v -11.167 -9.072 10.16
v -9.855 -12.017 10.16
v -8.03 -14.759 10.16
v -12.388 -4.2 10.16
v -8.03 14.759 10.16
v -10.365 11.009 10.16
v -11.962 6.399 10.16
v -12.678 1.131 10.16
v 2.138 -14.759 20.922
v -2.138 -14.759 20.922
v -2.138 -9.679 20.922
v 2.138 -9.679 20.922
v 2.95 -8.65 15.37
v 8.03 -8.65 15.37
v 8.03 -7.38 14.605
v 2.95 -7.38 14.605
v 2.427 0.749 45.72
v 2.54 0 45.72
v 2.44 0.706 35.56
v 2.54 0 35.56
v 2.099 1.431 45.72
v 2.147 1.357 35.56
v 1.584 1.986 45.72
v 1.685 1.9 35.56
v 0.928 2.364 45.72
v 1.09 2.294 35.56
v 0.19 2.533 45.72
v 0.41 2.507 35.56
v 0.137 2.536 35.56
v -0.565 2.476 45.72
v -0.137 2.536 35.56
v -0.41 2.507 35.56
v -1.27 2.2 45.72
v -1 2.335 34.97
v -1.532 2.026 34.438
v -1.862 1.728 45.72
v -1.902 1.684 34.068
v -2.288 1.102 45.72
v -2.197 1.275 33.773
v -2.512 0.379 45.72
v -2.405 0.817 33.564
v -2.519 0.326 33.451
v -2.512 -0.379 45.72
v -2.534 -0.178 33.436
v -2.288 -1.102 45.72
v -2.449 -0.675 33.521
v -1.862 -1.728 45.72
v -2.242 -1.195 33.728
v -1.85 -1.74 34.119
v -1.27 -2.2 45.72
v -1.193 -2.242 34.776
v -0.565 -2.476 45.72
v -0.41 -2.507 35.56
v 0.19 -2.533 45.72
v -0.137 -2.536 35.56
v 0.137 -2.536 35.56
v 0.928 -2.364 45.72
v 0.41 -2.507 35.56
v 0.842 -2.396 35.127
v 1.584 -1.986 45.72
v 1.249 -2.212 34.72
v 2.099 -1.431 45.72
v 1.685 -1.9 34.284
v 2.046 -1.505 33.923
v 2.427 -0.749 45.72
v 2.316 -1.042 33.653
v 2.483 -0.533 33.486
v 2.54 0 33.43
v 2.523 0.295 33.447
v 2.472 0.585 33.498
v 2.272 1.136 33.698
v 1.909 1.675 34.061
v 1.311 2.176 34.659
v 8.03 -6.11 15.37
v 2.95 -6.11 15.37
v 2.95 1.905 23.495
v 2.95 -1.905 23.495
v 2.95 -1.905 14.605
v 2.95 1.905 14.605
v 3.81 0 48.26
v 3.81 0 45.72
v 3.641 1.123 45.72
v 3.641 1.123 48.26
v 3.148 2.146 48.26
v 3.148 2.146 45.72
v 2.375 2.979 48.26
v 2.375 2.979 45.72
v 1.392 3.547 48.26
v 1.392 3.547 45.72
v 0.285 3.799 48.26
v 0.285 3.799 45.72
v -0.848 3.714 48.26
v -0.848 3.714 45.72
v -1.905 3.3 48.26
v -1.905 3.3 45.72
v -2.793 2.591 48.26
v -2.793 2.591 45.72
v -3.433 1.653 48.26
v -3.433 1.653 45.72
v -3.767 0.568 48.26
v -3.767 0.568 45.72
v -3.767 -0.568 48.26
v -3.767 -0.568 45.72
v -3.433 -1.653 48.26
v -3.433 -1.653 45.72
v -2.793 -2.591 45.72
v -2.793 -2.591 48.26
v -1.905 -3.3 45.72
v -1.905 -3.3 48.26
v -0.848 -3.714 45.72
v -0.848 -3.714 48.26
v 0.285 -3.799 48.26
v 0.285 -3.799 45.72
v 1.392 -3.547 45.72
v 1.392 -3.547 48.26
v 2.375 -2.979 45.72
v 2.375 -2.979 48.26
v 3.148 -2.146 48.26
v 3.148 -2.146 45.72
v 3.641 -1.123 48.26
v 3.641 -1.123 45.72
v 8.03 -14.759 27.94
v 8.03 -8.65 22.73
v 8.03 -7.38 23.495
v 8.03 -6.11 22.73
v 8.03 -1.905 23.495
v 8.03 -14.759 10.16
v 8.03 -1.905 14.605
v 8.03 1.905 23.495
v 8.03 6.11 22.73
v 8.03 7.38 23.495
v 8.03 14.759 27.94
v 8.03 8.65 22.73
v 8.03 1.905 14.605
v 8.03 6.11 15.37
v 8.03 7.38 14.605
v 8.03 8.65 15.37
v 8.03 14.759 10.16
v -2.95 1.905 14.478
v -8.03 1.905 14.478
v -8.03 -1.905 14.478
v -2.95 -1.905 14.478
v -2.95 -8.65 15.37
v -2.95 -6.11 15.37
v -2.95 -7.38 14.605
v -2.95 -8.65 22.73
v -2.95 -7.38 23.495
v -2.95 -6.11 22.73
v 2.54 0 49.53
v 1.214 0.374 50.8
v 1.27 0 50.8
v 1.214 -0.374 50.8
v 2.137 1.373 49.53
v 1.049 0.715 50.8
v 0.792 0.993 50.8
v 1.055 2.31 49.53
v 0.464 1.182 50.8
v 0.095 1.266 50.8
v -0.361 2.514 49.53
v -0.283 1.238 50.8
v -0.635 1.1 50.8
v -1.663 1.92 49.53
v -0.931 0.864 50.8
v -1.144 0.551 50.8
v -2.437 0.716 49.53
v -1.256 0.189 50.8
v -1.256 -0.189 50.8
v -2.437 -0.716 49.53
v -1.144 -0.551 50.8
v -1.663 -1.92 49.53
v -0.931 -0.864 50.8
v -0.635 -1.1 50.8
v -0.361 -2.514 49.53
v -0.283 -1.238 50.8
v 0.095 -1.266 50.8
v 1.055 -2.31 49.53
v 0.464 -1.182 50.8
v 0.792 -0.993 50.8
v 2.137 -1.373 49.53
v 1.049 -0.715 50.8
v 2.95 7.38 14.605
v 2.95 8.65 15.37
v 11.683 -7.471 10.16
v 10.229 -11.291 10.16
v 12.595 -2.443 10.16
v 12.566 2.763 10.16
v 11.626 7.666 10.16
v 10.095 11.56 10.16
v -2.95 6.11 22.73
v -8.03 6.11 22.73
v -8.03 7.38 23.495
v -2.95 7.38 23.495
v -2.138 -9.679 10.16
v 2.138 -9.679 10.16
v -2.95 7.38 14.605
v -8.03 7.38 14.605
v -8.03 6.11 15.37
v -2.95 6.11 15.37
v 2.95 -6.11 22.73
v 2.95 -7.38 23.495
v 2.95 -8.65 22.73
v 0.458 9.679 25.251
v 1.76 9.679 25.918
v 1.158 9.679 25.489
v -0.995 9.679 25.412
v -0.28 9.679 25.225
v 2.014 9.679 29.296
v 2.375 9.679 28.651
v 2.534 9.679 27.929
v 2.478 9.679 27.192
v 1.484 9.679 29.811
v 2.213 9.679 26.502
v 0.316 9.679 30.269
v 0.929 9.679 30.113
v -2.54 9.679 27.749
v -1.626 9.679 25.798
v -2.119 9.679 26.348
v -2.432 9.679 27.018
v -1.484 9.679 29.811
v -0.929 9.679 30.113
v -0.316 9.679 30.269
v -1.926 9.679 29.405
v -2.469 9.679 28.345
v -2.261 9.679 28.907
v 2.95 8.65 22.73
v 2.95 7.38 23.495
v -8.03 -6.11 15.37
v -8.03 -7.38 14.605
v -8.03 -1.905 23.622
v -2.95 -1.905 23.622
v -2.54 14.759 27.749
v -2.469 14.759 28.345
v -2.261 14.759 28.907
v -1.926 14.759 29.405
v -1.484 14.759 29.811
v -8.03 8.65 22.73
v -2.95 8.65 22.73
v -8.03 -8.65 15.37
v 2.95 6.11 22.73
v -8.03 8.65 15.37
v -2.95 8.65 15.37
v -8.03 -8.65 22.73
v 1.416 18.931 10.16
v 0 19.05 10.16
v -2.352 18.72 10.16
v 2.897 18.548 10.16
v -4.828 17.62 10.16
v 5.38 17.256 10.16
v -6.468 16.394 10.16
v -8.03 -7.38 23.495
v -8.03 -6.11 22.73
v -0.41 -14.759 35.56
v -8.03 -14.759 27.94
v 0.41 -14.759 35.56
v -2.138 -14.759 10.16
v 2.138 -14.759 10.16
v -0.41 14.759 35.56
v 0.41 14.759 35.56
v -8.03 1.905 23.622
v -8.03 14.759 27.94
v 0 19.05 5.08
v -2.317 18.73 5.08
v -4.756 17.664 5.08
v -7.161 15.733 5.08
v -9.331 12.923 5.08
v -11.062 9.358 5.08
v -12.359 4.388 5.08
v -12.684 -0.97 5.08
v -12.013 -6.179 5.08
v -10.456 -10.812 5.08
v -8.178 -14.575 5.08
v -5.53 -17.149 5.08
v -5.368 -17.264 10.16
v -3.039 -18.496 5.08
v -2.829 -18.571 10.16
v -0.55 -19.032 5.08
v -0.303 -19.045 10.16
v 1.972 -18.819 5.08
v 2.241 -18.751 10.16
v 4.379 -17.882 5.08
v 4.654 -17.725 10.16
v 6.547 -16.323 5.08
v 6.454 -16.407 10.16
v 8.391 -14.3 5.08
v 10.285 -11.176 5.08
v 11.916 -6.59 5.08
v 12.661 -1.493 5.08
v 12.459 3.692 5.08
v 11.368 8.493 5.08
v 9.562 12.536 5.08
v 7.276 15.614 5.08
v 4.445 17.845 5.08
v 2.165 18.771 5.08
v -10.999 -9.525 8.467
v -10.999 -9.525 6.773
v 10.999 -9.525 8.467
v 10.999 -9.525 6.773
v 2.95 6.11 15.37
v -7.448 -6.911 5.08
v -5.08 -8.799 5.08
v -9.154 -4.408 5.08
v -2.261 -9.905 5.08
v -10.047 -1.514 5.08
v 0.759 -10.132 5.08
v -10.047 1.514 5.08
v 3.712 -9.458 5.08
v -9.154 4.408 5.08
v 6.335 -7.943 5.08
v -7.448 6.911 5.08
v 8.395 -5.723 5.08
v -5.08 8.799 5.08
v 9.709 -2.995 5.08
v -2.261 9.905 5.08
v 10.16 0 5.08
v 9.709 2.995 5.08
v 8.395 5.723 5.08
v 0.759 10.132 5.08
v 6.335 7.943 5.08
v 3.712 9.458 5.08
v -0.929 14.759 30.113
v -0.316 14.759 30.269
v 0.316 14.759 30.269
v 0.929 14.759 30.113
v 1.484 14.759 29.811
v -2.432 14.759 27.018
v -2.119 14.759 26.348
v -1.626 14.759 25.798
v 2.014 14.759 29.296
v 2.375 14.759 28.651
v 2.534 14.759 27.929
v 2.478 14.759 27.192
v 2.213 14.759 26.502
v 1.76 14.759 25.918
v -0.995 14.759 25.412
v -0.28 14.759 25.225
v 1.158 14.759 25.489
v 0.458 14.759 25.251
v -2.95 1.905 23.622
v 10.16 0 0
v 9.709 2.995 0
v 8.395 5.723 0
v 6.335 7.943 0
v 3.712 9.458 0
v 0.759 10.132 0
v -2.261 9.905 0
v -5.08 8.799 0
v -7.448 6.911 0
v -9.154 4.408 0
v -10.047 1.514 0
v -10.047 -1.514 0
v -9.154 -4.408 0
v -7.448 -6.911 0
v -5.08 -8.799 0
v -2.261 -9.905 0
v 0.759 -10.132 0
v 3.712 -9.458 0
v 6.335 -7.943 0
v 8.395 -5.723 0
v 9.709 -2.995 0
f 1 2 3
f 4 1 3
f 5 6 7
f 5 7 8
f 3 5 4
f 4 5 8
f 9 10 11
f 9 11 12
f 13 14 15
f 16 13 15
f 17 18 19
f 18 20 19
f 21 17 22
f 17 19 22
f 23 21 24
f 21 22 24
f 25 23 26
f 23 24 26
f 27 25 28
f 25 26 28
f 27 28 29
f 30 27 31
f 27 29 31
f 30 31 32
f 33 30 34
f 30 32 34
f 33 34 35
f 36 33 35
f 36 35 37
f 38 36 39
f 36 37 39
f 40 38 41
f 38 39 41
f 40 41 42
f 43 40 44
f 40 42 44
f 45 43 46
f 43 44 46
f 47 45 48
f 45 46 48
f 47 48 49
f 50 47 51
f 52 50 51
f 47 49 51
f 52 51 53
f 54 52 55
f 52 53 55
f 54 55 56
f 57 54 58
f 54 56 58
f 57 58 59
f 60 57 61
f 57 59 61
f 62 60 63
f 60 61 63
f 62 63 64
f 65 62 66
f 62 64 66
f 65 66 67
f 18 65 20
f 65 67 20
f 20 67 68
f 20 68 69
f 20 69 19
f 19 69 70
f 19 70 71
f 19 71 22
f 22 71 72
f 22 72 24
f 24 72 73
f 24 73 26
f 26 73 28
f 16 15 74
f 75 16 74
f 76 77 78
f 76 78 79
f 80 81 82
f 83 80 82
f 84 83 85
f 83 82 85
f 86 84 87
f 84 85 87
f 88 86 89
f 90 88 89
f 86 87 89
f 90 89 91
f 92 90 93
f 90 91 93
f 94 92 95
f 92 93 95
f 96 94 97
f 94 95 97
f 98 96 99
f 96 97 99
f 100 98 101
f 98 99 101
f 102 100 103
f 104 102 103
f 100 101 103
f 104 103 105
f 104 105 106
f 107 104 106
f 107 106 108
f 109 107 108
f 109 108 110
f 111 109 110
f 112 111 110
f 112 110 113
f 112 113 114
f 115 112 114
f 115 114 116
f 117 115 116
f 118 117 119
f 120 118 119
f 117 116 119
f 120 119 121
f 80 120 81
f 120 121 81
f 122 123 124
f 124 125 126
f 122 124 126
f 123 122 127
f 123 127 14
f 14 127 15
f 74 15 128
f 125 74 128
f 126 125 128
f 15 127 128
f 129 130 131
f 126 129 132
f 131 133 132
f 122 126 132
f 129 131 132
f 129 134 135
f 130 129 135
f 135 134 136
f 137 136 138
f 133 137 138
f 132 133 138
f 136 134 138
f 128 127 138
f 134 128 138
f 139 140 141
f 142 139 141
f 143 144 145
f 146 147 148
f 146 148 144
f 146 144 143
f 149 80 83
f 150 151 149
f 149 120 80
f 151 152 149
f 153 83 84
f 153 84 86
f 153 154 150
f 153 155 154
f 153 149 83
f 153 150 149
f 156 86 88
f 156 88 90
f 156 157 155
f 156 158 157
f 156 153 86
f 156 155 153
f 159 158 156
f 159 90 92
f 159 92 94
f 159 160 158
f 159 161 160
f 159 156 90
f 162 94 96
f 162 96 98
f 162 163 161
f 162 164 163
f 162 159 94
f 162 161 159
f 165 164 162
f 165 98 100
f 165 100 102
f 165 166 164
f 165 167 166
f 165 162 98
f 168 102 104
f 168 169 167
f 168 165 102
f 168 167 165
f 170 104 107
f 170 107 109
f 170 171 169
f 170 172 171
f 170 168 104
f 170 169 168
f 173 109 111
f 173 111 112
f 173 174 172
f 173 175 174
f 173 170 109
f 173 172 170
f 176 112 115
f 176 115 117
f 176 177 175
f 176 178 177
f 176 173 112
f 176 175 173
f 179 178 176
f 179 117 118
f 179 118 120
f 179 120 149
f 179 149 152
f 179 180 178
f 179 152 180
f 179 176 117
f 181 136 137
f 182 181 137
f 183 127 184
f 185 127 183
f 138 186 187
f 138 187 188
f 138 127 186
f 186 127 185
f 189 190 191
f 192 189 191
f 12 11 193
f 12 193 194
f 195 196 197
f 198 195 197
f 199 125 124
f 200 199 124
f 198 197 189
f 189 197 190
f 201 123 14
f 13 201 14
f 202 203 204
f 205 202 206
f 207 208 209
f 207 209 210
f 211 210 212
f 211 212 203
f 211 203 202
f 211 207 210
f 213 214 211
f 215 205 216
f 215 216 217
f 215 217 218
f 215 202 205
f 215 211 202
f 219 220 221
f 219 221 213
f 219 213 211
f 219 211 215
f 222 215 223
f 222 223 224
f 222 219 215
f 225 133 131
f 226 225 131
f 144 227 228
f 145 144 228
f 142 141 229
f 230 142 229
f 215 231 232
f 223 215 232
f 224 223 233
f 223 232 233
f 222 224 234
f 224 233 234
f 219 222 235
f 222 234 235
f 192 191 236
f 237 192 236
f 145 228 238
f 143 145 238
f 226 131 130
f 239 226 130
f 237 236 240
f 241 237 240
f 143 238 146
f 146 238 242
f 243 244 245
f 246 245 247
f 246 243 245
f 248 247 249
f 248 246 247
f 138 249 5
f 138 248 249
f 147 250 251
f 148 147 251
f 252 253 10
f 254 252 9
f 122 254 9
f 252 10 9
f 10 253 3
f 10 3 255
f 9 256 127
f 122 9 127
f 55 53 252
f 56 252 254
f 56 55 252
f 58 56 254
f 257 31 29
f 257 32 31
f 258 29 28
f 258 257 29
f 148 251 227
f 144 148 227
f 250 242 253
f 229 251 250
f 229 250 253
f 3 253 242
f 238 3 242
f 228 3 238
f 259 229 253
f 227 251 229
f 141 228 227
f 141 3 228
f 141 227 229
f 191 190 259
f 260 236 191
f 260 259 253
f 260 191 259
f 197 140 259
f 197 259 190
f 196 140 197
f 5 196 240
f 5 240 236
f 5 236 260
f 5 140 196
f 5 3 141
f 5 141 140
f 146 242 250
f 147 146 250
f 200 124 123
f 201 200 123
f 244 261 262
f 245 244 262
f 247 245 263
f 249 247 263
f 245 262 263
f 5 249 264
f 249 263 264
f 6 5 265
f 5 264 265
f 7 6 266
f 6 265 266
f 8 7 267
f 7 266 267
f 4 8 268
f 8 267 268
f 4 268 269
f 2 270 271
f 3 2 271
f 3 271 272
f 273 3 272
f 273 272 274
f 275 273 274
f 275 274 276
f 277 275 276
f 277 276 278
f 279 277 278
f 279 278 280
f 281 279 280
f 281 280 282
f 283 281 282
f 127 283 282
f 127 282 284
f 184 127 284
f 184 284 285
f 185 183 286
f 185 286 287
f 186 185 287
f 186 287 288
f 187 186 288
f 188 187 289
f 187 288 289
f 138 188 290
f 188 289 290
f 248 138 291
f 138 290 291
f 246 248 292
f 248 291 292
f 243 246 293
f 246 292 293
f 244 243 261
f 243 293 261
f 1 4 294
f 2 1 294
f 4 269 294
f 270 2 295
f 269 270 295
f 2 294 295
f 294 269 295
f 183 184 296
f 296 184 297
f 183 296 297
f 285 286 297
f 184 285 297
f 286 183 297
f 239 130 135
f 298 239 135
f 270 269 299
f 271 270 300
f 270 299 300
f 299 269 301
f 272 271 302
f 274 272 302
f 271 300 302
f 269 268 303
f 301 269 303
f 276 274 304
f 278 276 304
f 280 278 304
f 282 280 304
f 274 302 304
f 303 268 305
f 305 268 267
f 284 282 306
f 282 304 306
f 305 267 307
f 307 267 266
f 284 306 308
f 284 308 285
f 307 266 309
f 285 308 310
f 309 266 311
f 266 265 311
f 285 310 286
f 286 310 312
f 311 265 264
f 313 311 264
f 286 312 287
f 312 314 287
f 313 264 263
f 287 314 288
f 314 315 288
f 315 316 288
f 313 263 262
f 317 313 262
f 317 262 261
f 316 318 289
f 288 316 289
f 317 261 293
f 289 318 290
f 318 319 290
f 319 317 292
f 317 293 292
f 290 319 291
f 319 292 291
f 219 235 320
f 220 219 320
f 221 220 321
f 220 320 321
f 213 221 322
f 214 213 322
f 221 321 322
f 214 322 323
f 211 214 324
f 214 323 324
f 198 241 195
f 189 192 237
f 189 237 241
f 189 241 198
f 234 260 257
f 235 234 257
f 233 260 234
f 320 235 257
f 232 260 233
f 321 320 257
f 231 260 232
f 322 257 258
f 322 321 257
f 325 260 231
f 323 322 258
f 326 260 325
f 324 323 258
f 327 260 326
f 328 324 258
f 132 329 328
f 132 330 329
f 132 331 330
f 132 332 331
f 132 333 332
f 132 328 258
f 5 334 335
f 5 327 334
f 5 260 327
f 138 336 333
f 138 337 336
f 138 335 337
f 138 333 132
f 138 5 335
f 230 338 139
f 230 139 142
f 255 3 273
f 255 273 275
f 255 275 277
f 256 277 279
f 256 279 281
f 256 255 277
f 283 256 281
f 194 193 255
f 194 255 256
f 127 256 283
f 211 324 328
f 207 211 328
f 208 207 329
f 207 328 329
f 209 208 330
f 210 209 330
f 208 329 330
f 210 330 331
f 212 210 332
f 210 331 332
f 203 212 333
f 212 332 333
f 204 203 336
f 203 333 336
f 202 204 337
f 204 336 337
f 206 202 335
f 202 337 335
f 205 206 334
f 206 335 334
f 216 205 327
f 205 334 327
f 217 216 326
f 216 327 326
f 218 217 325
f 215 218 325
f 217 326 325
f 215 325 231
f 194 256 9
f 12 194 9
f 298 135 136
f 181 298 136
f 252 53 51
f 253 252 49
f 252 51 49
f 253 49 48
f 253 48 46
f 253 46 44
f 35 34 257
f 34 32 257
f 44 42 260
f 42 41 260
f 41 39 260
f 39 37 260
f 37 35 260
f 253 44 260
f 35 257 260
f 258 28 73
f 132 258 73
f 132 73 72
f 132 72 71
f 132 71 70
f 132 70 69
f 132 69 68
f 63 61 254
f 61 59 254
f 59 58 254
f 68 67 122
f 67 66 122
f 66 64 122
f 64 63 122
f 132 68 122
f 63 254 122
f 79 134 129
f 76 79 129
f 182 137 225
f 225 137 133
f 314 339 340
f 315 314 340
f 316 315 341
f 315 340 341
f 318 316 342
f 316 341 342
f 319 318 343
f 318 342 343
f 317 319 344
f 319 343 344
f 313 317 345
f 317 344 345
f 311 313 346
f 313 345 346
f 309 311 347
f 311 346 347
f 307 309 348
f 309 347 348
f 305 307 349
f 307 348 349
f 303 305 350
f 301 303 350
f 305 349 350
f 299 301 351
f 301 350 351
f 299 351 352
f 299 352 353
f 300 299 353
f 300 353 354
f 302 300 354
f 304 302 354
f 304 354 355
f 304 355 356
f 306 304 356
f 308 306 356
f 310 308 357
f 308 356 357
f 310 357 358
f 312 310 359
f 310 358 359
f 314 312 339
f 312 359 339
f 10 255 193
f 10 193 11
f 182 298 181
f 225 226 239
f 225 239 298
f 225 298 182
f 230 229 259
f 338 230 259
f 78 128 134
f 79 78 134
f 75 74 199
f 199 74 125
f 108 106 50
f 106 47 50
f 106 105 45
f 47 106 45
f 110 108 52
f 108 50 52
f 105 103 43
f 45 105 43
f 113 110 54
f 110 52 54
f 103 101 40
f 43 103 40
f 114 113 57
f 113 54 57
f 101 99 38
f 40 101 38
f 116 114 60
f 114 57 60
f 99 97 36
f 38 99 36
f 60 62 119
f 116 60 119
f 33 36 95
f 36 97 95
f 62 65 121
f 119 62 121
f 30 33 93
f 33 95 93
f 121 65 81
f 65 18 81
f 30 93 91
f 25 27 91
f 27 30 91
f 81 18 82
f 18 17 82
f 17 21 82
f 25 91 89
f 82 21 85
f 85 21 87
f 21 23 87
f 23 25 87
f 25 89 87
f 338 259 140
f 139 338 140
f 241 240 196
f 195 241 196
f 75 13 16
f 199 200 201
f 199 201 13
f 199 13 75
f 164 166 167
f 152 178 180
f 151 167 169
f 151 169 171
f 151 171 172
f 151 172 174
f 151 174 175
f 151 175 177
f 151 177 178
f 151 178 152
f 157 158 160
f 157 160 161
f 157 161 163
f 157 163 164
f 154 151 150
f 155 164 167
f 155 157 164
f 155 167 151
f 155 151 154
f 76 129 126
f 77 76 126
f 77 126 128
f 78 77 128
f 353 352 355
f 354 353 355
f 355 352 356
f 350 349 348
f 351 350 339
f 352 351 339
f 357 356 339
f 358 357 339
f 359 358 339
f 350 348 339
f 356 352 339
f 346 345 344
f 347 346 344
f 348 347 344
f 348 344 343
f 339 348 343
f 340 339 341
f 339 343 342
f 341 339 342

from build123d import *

# Parameters (mm, degrees)
F0_R          = 10.16
F1_DEPTH      = 5.08
F3_DEPTH      = 5.08
F4_W          = 16.0591960874
F4_H          = 29.5184687494
F5_DEPTH      = 25.4
F6_R          = 2.54
F7_DEPTH      = 10.16
F8_R          = 3.81
F9_DEPTH      = 5.08
F10_SIZE      = 2.54
F11_T4_DEPTH  = 68.710917486
F11_S5_R      = 2.54
F11_T6_DEPTH  = 36
F11_T10_DEPTH = 68.710917486
F11_S11_R     = 2.54
F11_T12_DEPTH = 36
F12_W         = 4.2759752832
F12_H         = 10.7621589082
F13_DEPTH     = 5.08
F15_DEPTH     = 5.08
F17_DEPTH     = 5.08
F19_DEPTH     = 5.08


# Not quite as in the source:
# - a fillet or chamfer that OpenCascade refuses, or shapes differently, is made with other operations: its cross-section is extruded or revolved along the edge and cut away or added


with BuildPart() as f1:
    # F0 (on Top) → F1 (new body)
    with BuildSketch(Plane.XY):
        Circle(F0_R)
    extrude(amount=F1_DEPTH)

    # F2 (on face) → F3 (join)
    with BuildSketch(Plane.XY.offset(5.08)):
        with BuildLine():
            add(Edge.make_bspline(
                [(0, 19.05), (-21.9970452561, 19.05), (-10.9985226281, -9.525), (0, -38.1), (10.9985226281, -9.525), (21.9970452561, 19.05), (0, 19.05)],
                knots=[0, 0, 0, 2.0943951024, 2.0943951024, 4.1887902048, 4.1887902048, 6.2831853072, 6.2831853072, 6.2831853072], degree=2, weights=[1, 0.5, 1, 0.5, 1, 0.5, 1]))
        make_face()
    extrude(amount=F3_DEPTH)

    # F4 (on face) → F5 (join)
    with BuildSketch(Plane.XY.offset(10.16)):
        Rectangle(F4_W, F4_H)
    extrude(amount=F5_DEPTH)

    # F6 (on face) → F7 (join)
    with BuildSketch(Plane.XY.offset(35.56)):
        Circle(F6_R)
    extrude(amount=F7_DEPTH)

    # F8 (on face) → F9 (join)
    with BuildSketch(Plane.XY.offset(45.72)):
        Circle(F8_R)
    extrude(amount=F9_DEPTH)

    # F10
    f10_edges = [f1.edges().sort_by_distance(p)[0] for p in [
        (-3.81, 0, 50.8),
    ]]
    chamfer(f10_edges, length=F10_SIZE)

    # F11: chamfer of 7.62 on 2 edges, made by hand


with BuildPart() as f11_tool2:
    # F11_s3 → F11_t4 (new body)
    with BuildSketch(Plane.XZ.offset(34.355458743)):
        with BuildLine():
            Line((0.1940718968, 35.7755261469), (8.2451241906, 27.7244738531))
            Line((8.2451241906, 27.7244738531), (8.3975241906, 27.7244738531))
            ThreePointArc((8.3975241906, 27.7244738531), (8.1819980437, 31.6422369265), (8.1819980437, 35.56))
            Line((8.1819980437, 35.56), (8.0295980437, 35.7124))
            ThreePointArc((8.0295980437, 35.7124), (4.1118349703, 35.7124), (0.1940718968, 35.9279261469))
            Line((0.1940718968, 35.9279261469), (0.1940718968, 35.7755261469))
        make_face()
    extrude(amount=-F11_T4_DEPTH)

    # F11_s5 → F11_t6 (cut, symmetric)
    with BuildSketch(Plane.XY.offset(31.8)):
        Circle(F11_S5_R)
    extrude(amount=F11_T6_DEPTH, both=True, mode=Mode.SUBTRACT)


with BuildPart() as f1_1:
    add(f1.part)

    # F11_t1: cut F11_tool2
    add(f11_tool2.part, mode=Mode.SUBTRACT)


with BuildPart() as f11_tool8:
    # F11_s9 → F11_t10 (new body)
    with BuildSketch(Plane.XZ.offset(-34.355458743)):
        with BuildLine():
            Line((-0.1940718968, 35.7755261469), (-8.2451241906, 27.7244738531))
            Line((-8.2451241906, 27.7244738531), (-8.3975241906, 27.7244738531))
            ThreePointArc((-8.3975241906, 27.7244738531), (-8.1819980437, 31.6422369265), (-8.1819980437, 35.56))
            Line((-8.1819980437, 35.56), (-8.0295980437, 35.7124))
            ThreePointArc((-8.0295980437, 35.7124), (-4.1118349703, 35.7124), (-0.1940718968, 35.9279261469))
            Line((-0.1940718968, 35.9279261469), (-0.1940718968, 35.7755261469))
        make_face()
    extrude(amount=F11_T10_DEPTH)

    # F11_s11 → F11_t12 (cut, symmetric)
    with BuildSketch(Plane.XY.offset(31.8)):
        Circle(F11_S11_R)
    extrude(amount=F11_T12_DEPTH, both=True, mode=Mode.SUBTRACT)


with BuildPart() as f1_2:
    add(f1_1.part)

    # F11_t7: cut F11_tool8
    add(f11_tool8.part, mode=Mode.SUBTRACT)

    # F12 (on face) → F13 (cut)
    with BuildSketch(Plane.XZ.offset(14.7592343747)):
        with Locations((0, 15.5410794541)):
            Rectangle(F12_W, F12_H)
    extrude(amount=-F13_DEPTH, mode=Mode.SUBTRACT)

    # F14 (on face) → F15 (cut)
    with BuildSketch(Plane(origin=(0, 14.7592343747, 0), x_dir=(-1, 0, 0), z_dir=(0, 1, 0))):
        with BuildLine():
            ThreePointArc((1.483647583, 29.810695909), (0, 29.332343272), (-1.483647583, 29.810695909))
            ThreePointArc((-1.483647583, 29.810695909), (-1.1582605793, 25.4885104617), (2.54, 27.749048546))
            ThreePointArc((2.54, 27.749048546), (2.2605380843, 28.9073091253), (1.483647583, 29.810695909))
        make_face()
        with BuildLine():
            ThreePointArc((1.483647583, 29.810695909), (0, 30.289048546), (-1.483647583, 29.810695909))
            ThreePointArc((-1.483647583, 29.810695909), (0, 29.332343272), (1.483647583, 29.810695909))
        make_face()
    extrude(amount=-F15_DEPTH, mode=Mode.SUBTRACT)

    # F16 (on face) → F17 (cut)
    with BuildSketch(Plane.YZ.offset(8.0295980437)):
        Polygon((-7.3796171873, 19.05), (-7.3796171873, 23.495), (-8.6496171873, 22.7300348458), (-8.6496171873, 19.05), align=None)
        Polygon((-6.1096171873, 22.7300348458), (-7.3796171873, 23.495), (-7.3796171873, 19.05), (-6.1096171873, 19.05), align=None)
        Polygon((-6.1096171873, 19.05), (-7.3796171873, 19.05), (-7.3796171873, 14.605), (-6.1096171873, 15.3699651542), align=None)
        Polygon((-7.3796171873, 14.605), (-7.3796171873, 19.05), (-8.6496171873, 19.05), (-8.6496171873, 15.3699651542), align=None)
        Polygon((0, 19.05), (0, 23.495), (-1.905, 23.495), (-1.905, 20.1974477314), align=None)
        Polygon((1.905, 23.495), (0, 23.495), (0, 19.05), (1.905, 20.1974477314), align=None)
        Polygon((-1.905, 19.05), (0, 19.05), (-1.905, 20.1974477314), align=None)
        Polygon((1.905, 20.1974477314), (0, 19.05), (1.905, 19.05), align=None)
        Polygon((1.905, 19.05), (0, 19.05), (1.905, 17.9025522686), align=None)
        Polygon((1.905, 17.9025522686), (0, 19.05), (0, 14.605), (1.905, 14.605), align=None)
        Polygon((0, 14.605), (0, 19.05), (-1.905, 17.9025522686), (-1.905, 14.605), align=None)
        Polygon((-1.905, 17.9025522686), (0, 19.05), (-1.905, 19.05), align=None)
        Polygon((7.3796171873, 14.605), (7.3796171873, 19.05), (6.1096171873, 19.05), (6.1096171873, 15.3699651542), align=None)
        Polygon((7.3796171873, 14.605), (8.6496171873, 15.3699651542), (8.6496171873, 19.05), (7.3796171873, 19.05), align=None)
        Polygon((8.6496171873, 22.7300348458), (7.3796171873, 23.495), (7.3796171873, 19.05), (8.6496171873, 19.05), align=None)
        Polygon((7.3796171873, 19.05), (7.3796171873, 23.495), (6.1096171873, 22.7300348458), (6.1096171873, 19.05), align=None)
    extrude(amount=-F17_DEPTH, mode=Mode.SUBTRACT)

    # F18 (on face) → F19 (cut)
    with BuildSketch(Plane(origin=(-8.0295980437, 0, 0), x_dir=(0, -1, 0), z_dir=(-1, 0, 0))):
        Polygon((-6.1096171873, 19.05), (-7.3796171873, 19.05), (-7.3796171873, 14.605), (-6.1096171873, 15.3699651542), align=None)
        Polygon((-7.3796171873, 19.05), (-7.3796171873, 23.495), (-8.6496171873, 22.7300348458), (-8.6496171873, 19.05), align=None)
        Polygon((0, 19.05), (0, 23.622), (-1.905, 23.622), (-1.905, 20.1974477314), align=None)
        Polygon((-1.905, 19.05), (0, 19.05), (-1.905, 20.1974477314), align=None)
        Polygon((-1.905, 17.9025522686), (0, 19.05), (-1.905, 19.05), align=None)
        Polygon((0, 14.478), (0, 19.05), (-1.905, 17.9025522686), (-1.905, 14.478), align=None)
        Polygon((1.905, 17.9025522686), (0, 19.05), (0, 14.478), (1.905, 14.478), align=None)
        Polygon((1.905, 19.05), (0, 19.05), (1.905, 17.9025522686), align=None)
        Polygon((1.905, 20.1974477314), (0, 19.05), (1.905, 19.05), align=None)
        Polygon((1.905, 23.622), (0, 23.622), (0, 19.05), (1.905, 20.1974477314), align=None)
        Polygon((7.3796171873, 19.05), (7.3796171873, 23.495), (6.1096171873, 22.7300348458), (6.1096171873, 19.05), align=None)
        Polygon((8.6496171873, 22.7300348458), (7.3796171873, 23.495), (7.3796171873, 19.05), (8.6496171873, 19.05), align=None)
        Polygon((7.3796171873, 14.605), (7.3796171873, 19.05), (6.1096171873, 19.05), (6.1096171873, 15.3699651542), align=None)
        Polygon((-6.1096171873, 22.7300348458), (-7.3796171873, 23.495), (-7.3796171873, 19.05), (-6.1096171873, 19.05), align=None)
        Polygon((-8.6496171873, 19.05), (-8.6496171873, 15.3699651542), (-7.3796171873, 14.605), (-7.3796171873, 19.05), align=None)
        Polygon((8.6496171873, 19.05), (7.3796171873, 19.05), (7.3796171873, 14.605), (8.6496171873, 15.3699651542), align=None)
    extrude(amount=-F19_DEPTH, mode=Mode.SUBTRACT)


solid = f1_2.part
